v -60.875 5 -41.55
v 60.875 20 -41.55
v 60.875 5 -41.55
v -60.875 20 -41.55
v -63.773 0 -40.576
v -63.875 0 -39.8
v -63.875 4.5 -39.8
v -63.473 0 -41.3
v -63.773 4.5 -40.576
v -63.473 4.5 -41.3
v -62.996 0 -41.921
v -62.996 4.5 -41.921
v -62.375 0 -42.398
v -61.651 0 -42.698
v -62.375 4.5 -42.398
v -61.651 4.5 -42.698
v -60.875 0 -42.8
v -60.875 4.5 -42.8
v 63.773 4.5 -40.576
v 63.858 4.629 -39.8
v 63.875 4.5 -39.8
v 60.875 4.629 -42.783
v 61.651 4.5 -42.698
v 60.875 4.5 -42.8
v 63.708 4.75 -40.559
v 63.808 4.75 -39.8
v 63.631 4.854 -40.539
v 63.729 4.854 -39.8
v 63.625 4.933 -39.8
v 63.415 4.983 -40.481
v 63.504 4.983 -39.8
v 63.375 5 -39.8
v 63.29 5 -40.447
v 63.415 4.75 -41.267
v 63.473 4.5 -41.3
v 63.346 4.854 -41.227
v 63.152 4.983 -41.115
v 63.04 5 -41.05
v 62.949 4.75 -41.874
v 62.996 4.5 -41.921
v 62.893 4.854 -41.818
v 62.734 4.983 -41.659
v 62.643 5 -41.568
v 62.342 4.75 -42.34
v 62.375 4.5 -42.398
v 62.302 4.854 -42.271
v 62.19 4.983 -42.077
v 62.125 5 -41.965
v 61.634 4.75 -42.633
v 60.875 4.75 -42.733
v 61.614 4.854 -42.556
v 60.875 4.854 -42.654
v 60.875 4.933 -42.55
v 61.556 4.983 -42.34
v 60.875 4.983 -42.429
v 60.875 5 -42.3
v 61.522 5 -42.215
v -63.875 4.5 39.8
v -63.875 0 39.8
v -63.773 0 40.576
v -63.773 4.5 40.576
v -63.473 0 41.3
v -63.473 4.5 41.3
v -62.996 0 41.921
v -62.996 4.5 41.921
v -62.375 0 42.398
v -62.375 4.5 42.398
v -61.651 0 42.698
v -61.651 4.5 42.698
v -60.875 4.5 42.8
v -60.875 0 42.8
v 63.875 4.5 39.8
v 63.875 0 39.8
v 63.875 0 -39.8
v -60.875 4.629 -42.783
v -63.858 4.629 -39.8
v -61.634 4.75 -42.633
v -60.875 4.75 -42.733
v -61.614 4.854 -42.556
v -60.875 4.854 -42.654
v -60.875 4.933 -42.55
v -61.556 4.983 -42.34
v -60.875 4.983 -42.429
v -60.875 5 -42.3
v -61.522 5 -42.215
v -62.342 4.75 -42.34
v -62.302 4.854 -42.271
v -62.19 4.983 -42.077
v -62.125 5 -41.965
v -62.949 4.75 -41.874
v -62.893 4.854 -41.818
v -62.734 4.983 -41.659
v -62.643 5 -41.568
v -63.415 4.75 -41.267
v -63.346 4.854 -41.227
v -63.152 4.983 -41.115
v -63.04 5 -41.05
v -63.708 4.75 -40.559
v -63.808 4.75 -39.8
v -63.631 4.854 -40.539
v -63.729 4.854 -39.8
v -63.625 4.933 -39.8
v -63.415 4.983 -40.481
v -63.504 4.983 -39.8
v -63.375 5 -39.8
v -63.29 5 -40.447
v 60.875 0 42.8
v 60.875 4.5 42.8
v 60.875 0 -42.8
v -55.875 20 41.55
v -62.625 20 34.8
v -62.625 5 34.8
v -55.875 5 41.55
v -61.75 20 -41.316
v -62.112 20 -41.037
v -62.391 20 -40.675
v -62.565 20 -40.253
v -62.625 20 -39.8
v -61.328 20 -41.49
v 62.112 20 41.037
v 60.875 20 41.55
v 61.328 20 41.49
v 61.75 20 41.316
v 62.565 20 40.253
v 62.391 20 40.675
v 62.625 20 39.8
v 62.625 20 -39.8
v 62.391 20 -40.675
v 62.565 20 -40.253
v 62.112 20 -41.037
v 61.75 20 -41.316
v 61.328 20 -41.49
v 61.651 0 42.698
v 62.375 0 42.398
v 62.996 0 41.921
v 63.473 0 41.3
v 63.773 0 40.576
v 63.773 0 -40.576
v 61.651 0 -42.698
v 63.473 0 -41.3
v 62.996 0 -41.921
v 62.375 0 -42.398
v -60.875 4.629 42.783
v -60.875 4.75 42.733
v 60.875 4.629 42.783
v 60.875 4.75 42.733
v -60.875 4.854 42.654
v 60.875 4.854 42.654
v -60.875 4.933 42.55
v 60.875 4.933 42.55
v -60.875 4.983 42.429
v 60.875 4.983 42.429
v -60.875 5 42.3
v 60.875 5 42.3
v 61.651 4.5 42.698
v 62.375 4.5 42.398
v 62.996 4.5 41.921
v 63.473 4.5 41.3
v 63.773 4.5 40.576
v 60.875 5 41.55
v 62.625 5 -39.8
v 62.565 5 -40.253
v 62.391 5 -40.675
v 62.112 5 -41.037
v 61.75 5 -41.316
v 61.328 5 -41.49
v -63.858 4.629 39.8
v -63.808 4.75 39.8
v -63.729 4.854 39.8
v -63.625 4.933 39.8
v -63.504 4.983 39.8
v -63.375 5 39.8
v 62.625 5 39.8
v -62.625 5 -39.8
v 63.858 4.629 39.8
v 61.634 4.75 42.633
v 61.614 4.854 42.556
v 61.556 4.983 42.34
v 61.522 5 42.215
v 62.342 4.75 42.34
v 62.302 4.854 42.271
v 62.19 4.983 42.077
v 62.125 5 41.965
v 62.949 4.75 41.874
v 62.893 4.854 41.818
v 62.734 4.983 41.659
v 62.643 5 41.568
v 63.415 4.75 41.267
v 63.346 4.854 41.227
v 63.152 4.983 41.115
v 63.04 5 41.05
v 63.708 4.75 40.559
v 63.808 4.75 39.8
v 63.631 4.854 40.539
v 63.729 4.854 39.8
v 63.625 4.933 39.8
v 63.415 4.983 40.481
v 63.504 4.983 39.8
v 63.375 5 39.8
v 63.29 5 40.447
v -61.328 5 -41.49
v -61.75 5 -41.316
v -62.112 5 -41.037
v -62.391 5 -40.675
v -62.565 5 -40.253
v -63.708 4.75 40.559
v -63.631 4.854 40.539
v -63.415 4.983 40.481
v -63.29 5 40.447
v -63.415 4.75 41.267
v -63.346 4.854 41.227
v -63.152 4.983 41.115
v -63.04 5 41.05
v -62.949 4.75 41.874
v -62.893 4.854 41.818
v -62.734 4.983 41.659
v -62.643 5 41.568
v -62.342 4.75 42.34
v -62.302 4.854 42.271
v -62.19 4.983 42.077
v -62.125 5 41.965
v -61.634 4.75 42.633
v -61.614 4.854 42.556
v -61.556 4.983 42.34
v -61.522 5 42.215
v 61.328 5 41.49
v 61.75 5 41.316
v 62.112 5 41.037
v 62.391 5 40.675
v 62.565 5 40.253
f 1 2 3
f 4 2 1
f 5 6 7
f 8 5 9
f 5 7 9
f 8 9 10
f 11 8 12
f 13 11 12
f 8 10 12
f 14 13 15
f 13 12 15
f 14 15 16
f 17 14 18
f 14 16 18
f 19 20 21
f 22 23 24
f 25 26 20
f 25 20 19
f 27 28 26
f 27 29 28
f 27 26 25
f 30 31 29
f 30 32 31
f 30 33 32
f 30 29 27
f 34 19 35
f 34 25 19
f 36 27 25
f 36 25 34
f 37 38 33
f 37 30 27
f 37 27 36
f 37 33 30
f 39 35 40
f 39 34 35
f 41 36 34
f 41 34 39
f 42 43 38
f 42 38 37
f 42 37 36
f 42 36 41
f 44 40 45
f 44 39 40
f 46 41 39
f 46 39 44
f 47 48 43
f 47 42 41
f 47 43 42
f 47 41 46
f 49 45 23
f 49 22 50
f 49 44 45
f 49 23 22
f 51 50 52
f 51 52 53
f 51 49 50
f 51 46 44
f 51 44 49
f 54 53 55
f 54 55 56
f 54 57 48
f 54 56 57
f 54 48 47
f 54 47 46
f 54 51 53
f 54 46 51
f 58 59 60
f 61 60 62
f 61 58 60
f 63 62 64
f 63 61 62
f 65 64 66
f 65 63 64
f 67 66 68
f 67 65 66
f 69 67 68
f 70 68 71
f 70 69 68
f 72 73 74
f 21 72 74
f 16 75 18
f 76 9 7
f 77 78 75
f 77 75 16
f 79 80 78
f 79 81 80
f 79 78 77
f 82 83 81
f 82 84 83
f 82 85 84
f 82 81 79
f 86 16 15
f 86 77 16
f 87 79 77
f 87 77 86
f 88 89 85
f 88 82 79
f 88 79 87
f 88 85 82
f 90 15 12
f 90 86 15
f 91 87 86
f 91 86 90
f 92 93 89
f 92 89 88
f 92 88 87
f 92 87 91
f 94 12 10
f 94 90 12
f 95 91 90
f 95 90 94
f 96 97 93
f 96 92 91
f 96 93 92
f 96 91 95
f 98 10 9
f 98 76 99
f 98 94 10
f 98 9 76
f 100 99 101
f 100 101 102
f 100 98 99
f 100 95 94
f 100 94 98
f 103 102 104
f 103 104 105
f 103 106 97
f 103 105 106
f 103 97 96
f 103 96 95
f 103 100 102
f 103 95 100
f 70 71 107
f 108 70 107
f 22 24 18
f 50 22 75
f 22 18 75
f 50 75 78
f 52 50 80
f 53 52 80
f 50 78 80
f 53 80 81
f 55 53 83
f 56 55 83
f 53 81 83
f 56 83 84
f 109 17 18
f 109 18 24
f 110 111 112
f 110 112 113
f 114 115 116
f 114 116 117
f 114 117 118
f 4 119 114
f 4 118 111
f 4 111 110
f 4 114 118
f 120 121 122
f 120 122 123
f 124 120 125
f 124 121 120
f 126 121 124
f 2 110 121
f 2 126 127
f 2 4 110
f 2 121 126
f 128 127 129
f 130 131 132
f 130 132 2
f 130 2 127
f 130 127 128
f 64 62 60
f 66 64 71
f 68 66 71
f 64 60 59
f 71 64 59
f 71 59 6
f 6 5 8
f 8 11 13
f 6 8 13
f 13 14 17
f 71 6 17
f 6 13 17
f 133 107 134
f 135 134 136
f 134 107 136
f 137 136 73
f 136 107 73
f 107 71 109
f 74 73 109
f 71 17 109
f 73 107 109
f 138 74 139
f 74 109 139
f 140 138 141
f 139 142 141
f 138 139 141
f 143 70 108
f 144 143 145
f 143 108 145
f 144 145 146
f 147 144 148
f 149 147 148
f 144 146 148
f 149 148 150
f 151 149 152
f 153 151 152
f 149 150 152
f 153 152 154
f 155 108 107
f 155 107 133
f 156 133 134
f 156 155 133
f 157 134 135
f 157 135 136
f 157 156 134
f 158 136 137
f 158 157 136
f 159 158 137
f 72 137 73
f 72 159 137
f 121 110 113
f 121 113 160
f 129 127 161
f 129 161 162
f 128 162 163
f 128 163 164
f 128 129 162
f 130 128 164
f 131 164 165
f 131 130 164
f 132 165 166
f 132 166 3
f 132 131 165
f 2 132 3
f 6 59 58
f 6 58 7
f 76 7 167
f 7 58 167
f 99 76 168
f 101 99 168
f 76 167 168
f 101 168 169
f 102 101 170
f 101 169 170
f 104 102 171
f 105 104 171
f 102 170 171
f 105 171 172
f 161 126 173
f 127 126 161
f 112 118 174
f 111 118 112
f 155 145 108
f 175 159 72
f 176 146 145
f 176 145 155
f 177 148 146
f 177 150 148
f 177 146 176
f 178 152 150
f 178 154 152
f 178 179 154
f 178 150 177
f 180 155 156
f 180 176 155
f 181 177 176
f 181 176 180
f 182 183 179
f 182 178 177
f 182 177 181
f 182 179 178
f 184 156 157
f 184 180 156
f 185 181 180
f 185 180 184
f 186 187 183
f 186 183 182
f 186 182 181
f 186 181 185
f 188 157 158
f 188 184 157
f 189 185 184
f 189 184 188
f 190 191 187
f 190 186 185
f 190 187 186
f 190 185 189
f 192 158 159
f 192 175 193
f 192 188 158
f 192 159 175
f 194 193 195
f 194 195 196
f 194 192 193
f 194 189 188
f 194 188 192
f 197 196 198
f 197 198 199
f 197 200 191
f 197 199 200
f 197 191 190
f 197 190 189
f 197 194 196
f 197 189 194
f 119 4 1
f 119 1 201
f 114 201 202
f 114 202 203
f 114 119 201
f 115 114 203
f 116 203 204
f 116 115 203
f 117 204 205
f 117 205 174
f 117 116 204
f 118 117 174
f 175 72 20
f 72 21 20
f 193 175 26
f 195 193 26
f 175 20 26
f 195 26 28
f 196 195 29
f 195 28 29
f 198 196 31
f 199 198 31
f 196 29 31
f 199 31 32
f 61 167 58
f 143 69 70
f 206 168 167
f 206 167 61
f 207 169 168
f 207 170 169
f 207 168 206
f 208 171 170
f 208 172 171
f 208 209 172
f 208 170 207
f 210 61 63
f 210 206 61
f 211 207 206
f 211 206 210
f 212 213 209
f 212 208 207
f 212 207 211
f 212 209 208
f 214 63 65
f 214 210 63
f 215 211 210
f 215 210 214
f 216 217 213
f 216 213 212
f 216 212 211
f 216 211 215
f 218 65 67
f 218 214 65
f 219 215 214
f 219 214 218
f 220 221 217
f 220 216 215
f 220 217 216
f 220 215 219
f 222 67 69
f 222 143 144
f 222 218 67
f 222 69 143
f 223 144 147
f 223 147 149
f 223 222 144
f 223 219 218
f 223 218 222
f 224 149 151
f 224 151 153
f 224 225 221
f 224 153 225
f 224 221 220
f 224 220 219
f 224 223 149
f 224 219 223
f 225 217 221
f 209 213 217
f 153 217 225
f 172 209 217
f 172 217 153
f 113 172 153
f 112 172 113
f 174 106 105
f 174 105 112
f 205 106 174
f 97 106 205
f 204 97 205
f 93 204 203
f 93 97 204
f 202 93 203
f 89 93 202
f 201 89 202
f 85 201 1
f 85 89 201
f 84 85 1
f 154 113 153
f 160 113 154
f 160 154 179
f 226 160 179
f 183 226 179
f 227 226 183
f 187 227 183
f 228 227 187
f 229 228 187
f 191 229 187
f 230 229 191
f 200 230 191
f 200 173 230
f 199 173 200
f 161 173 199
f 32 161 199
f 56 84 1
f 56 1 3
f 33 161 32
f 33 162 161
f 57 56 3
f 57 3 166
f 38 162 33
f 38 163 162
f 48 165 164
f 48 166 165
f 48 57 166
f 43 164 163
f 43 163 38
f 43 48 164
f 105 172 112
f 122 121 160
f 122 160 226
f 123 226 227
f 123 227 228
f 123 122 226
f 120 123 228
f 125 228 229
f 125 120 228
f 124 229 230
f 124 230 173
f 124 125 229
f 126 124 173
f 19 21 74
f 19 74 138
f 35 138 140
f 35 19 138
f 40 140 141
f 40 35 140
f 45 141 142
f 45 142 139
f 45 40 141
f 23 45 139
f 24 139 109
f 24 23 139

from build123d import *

# Parameters (mm, degrees)
SKETCH1_W           = 127.75
SKETCH1_H           = 85.6
BOSS_EXTRUDE1_DEPTH = 20
FILLET1_R           = 3
CUT_EXTRUDE2_DEPTH  = 15
FILLET5_R           = 0.5


with BuildPart() as part:
    # Sketch1 → Boss-Extrude1 (new body)
    with BuildSketch(Plane(origin=(0, 0, 0), x_dir=(1, 0, 0), z_dir=(0, 1, 0))):
        Rectangle(SKETCH1_W, SKETCH1_H)
    extrude(amount=BOSS_EXTRUDE1_DEPTH)

    # Fillet1
    fillet1_edges = [part.edges().sort_by_distance(p)[0] for p in [
        (-63.875, 10, -42.8),
        (63.875, 10, -42.8),
        (63.875, 10, 42.8),
        (-63.875, 10, 42.8),
    ]]
    fillet(fillet1_edges, radius=FILLET1_R)

    # Sketch3 → Cut-Extrude2 (cut)
    with BuildSketch(Plane(origin=(0, 20, 0), x_dir=(1, 0, 0), z_dir=(0, 1, 0))):
        with BuildLine():
            Line((-63.875, 39.8), (-63.875, -39.8))
            ThreePointArc((-63.875, -39.8), (-62.996320344, -41.921320344), (-60.875, -42.8))
            Line((-60.875, -42.8), (60.875, -42.8))
            ThreePointArc((60.875, -42.8), (62.996320344, -41.921320344), (63.875, -39.8))
            Line((63.875, -39.8), (63.875, 39.8))
            ThreePointArc((63.875, 39.8), (62.996320344, 41.921320344), (60.875, 42.8))
            Line((60.875, 42.8), (-60.875, 42.8))
            ThreePointArc((-60.875, 42.8), (-62.996320344, 41.921320344), (-63.875, 39.8))
        make_face()
        with BuildLine():
            Line((-62.625, 39.8), (-62.625, -34.8))
            Line((-62.625, -34.8), (-55.875, -41.55))
            Line((-55.875, -41.55), (60.875, -41.55))
            ThreePointArc((60.875, -41.55), (62.112436867, -41.037436867), (62.625, -39.8))
            Line((62.625, -39.8), (62.625, 39.8))
            ThreePointArc((62.625, 39.8), (62.112436867, 41.037436867), (60.875, 41.55))
            Line((60.875, 41.55), (-60.875, 41.55))
            ThreePointArc((-60.875, 41.55), (-62.112436867, 41.037436867), (-62.625, 39.8))
        make_face(mode=Mode.SUBTRACT)
    extrude(amount=-CUT_EXTRUDE2_DEPTH, mode=Mode.SUBTRACT)

    # Fillet5
    fillet5_edges = [part.edges().sort_by_distance(p)[0] for p in [
        (-62.996320344, 5, -41.921320344),
        (0, 5, -42.8),
        (62.996320344, 5, -41.921320344),
        (63.875, 5, 0),
        (62.996320344, 5, 41.921320344),
        (0, 5, 42.8),
        (-62.996320344, 5, 41.921320344),
        (-63.875, 5, 0),
    ]]
    fillet(fillet5_edges, radius=FILLET5_R)


solid = part.part
